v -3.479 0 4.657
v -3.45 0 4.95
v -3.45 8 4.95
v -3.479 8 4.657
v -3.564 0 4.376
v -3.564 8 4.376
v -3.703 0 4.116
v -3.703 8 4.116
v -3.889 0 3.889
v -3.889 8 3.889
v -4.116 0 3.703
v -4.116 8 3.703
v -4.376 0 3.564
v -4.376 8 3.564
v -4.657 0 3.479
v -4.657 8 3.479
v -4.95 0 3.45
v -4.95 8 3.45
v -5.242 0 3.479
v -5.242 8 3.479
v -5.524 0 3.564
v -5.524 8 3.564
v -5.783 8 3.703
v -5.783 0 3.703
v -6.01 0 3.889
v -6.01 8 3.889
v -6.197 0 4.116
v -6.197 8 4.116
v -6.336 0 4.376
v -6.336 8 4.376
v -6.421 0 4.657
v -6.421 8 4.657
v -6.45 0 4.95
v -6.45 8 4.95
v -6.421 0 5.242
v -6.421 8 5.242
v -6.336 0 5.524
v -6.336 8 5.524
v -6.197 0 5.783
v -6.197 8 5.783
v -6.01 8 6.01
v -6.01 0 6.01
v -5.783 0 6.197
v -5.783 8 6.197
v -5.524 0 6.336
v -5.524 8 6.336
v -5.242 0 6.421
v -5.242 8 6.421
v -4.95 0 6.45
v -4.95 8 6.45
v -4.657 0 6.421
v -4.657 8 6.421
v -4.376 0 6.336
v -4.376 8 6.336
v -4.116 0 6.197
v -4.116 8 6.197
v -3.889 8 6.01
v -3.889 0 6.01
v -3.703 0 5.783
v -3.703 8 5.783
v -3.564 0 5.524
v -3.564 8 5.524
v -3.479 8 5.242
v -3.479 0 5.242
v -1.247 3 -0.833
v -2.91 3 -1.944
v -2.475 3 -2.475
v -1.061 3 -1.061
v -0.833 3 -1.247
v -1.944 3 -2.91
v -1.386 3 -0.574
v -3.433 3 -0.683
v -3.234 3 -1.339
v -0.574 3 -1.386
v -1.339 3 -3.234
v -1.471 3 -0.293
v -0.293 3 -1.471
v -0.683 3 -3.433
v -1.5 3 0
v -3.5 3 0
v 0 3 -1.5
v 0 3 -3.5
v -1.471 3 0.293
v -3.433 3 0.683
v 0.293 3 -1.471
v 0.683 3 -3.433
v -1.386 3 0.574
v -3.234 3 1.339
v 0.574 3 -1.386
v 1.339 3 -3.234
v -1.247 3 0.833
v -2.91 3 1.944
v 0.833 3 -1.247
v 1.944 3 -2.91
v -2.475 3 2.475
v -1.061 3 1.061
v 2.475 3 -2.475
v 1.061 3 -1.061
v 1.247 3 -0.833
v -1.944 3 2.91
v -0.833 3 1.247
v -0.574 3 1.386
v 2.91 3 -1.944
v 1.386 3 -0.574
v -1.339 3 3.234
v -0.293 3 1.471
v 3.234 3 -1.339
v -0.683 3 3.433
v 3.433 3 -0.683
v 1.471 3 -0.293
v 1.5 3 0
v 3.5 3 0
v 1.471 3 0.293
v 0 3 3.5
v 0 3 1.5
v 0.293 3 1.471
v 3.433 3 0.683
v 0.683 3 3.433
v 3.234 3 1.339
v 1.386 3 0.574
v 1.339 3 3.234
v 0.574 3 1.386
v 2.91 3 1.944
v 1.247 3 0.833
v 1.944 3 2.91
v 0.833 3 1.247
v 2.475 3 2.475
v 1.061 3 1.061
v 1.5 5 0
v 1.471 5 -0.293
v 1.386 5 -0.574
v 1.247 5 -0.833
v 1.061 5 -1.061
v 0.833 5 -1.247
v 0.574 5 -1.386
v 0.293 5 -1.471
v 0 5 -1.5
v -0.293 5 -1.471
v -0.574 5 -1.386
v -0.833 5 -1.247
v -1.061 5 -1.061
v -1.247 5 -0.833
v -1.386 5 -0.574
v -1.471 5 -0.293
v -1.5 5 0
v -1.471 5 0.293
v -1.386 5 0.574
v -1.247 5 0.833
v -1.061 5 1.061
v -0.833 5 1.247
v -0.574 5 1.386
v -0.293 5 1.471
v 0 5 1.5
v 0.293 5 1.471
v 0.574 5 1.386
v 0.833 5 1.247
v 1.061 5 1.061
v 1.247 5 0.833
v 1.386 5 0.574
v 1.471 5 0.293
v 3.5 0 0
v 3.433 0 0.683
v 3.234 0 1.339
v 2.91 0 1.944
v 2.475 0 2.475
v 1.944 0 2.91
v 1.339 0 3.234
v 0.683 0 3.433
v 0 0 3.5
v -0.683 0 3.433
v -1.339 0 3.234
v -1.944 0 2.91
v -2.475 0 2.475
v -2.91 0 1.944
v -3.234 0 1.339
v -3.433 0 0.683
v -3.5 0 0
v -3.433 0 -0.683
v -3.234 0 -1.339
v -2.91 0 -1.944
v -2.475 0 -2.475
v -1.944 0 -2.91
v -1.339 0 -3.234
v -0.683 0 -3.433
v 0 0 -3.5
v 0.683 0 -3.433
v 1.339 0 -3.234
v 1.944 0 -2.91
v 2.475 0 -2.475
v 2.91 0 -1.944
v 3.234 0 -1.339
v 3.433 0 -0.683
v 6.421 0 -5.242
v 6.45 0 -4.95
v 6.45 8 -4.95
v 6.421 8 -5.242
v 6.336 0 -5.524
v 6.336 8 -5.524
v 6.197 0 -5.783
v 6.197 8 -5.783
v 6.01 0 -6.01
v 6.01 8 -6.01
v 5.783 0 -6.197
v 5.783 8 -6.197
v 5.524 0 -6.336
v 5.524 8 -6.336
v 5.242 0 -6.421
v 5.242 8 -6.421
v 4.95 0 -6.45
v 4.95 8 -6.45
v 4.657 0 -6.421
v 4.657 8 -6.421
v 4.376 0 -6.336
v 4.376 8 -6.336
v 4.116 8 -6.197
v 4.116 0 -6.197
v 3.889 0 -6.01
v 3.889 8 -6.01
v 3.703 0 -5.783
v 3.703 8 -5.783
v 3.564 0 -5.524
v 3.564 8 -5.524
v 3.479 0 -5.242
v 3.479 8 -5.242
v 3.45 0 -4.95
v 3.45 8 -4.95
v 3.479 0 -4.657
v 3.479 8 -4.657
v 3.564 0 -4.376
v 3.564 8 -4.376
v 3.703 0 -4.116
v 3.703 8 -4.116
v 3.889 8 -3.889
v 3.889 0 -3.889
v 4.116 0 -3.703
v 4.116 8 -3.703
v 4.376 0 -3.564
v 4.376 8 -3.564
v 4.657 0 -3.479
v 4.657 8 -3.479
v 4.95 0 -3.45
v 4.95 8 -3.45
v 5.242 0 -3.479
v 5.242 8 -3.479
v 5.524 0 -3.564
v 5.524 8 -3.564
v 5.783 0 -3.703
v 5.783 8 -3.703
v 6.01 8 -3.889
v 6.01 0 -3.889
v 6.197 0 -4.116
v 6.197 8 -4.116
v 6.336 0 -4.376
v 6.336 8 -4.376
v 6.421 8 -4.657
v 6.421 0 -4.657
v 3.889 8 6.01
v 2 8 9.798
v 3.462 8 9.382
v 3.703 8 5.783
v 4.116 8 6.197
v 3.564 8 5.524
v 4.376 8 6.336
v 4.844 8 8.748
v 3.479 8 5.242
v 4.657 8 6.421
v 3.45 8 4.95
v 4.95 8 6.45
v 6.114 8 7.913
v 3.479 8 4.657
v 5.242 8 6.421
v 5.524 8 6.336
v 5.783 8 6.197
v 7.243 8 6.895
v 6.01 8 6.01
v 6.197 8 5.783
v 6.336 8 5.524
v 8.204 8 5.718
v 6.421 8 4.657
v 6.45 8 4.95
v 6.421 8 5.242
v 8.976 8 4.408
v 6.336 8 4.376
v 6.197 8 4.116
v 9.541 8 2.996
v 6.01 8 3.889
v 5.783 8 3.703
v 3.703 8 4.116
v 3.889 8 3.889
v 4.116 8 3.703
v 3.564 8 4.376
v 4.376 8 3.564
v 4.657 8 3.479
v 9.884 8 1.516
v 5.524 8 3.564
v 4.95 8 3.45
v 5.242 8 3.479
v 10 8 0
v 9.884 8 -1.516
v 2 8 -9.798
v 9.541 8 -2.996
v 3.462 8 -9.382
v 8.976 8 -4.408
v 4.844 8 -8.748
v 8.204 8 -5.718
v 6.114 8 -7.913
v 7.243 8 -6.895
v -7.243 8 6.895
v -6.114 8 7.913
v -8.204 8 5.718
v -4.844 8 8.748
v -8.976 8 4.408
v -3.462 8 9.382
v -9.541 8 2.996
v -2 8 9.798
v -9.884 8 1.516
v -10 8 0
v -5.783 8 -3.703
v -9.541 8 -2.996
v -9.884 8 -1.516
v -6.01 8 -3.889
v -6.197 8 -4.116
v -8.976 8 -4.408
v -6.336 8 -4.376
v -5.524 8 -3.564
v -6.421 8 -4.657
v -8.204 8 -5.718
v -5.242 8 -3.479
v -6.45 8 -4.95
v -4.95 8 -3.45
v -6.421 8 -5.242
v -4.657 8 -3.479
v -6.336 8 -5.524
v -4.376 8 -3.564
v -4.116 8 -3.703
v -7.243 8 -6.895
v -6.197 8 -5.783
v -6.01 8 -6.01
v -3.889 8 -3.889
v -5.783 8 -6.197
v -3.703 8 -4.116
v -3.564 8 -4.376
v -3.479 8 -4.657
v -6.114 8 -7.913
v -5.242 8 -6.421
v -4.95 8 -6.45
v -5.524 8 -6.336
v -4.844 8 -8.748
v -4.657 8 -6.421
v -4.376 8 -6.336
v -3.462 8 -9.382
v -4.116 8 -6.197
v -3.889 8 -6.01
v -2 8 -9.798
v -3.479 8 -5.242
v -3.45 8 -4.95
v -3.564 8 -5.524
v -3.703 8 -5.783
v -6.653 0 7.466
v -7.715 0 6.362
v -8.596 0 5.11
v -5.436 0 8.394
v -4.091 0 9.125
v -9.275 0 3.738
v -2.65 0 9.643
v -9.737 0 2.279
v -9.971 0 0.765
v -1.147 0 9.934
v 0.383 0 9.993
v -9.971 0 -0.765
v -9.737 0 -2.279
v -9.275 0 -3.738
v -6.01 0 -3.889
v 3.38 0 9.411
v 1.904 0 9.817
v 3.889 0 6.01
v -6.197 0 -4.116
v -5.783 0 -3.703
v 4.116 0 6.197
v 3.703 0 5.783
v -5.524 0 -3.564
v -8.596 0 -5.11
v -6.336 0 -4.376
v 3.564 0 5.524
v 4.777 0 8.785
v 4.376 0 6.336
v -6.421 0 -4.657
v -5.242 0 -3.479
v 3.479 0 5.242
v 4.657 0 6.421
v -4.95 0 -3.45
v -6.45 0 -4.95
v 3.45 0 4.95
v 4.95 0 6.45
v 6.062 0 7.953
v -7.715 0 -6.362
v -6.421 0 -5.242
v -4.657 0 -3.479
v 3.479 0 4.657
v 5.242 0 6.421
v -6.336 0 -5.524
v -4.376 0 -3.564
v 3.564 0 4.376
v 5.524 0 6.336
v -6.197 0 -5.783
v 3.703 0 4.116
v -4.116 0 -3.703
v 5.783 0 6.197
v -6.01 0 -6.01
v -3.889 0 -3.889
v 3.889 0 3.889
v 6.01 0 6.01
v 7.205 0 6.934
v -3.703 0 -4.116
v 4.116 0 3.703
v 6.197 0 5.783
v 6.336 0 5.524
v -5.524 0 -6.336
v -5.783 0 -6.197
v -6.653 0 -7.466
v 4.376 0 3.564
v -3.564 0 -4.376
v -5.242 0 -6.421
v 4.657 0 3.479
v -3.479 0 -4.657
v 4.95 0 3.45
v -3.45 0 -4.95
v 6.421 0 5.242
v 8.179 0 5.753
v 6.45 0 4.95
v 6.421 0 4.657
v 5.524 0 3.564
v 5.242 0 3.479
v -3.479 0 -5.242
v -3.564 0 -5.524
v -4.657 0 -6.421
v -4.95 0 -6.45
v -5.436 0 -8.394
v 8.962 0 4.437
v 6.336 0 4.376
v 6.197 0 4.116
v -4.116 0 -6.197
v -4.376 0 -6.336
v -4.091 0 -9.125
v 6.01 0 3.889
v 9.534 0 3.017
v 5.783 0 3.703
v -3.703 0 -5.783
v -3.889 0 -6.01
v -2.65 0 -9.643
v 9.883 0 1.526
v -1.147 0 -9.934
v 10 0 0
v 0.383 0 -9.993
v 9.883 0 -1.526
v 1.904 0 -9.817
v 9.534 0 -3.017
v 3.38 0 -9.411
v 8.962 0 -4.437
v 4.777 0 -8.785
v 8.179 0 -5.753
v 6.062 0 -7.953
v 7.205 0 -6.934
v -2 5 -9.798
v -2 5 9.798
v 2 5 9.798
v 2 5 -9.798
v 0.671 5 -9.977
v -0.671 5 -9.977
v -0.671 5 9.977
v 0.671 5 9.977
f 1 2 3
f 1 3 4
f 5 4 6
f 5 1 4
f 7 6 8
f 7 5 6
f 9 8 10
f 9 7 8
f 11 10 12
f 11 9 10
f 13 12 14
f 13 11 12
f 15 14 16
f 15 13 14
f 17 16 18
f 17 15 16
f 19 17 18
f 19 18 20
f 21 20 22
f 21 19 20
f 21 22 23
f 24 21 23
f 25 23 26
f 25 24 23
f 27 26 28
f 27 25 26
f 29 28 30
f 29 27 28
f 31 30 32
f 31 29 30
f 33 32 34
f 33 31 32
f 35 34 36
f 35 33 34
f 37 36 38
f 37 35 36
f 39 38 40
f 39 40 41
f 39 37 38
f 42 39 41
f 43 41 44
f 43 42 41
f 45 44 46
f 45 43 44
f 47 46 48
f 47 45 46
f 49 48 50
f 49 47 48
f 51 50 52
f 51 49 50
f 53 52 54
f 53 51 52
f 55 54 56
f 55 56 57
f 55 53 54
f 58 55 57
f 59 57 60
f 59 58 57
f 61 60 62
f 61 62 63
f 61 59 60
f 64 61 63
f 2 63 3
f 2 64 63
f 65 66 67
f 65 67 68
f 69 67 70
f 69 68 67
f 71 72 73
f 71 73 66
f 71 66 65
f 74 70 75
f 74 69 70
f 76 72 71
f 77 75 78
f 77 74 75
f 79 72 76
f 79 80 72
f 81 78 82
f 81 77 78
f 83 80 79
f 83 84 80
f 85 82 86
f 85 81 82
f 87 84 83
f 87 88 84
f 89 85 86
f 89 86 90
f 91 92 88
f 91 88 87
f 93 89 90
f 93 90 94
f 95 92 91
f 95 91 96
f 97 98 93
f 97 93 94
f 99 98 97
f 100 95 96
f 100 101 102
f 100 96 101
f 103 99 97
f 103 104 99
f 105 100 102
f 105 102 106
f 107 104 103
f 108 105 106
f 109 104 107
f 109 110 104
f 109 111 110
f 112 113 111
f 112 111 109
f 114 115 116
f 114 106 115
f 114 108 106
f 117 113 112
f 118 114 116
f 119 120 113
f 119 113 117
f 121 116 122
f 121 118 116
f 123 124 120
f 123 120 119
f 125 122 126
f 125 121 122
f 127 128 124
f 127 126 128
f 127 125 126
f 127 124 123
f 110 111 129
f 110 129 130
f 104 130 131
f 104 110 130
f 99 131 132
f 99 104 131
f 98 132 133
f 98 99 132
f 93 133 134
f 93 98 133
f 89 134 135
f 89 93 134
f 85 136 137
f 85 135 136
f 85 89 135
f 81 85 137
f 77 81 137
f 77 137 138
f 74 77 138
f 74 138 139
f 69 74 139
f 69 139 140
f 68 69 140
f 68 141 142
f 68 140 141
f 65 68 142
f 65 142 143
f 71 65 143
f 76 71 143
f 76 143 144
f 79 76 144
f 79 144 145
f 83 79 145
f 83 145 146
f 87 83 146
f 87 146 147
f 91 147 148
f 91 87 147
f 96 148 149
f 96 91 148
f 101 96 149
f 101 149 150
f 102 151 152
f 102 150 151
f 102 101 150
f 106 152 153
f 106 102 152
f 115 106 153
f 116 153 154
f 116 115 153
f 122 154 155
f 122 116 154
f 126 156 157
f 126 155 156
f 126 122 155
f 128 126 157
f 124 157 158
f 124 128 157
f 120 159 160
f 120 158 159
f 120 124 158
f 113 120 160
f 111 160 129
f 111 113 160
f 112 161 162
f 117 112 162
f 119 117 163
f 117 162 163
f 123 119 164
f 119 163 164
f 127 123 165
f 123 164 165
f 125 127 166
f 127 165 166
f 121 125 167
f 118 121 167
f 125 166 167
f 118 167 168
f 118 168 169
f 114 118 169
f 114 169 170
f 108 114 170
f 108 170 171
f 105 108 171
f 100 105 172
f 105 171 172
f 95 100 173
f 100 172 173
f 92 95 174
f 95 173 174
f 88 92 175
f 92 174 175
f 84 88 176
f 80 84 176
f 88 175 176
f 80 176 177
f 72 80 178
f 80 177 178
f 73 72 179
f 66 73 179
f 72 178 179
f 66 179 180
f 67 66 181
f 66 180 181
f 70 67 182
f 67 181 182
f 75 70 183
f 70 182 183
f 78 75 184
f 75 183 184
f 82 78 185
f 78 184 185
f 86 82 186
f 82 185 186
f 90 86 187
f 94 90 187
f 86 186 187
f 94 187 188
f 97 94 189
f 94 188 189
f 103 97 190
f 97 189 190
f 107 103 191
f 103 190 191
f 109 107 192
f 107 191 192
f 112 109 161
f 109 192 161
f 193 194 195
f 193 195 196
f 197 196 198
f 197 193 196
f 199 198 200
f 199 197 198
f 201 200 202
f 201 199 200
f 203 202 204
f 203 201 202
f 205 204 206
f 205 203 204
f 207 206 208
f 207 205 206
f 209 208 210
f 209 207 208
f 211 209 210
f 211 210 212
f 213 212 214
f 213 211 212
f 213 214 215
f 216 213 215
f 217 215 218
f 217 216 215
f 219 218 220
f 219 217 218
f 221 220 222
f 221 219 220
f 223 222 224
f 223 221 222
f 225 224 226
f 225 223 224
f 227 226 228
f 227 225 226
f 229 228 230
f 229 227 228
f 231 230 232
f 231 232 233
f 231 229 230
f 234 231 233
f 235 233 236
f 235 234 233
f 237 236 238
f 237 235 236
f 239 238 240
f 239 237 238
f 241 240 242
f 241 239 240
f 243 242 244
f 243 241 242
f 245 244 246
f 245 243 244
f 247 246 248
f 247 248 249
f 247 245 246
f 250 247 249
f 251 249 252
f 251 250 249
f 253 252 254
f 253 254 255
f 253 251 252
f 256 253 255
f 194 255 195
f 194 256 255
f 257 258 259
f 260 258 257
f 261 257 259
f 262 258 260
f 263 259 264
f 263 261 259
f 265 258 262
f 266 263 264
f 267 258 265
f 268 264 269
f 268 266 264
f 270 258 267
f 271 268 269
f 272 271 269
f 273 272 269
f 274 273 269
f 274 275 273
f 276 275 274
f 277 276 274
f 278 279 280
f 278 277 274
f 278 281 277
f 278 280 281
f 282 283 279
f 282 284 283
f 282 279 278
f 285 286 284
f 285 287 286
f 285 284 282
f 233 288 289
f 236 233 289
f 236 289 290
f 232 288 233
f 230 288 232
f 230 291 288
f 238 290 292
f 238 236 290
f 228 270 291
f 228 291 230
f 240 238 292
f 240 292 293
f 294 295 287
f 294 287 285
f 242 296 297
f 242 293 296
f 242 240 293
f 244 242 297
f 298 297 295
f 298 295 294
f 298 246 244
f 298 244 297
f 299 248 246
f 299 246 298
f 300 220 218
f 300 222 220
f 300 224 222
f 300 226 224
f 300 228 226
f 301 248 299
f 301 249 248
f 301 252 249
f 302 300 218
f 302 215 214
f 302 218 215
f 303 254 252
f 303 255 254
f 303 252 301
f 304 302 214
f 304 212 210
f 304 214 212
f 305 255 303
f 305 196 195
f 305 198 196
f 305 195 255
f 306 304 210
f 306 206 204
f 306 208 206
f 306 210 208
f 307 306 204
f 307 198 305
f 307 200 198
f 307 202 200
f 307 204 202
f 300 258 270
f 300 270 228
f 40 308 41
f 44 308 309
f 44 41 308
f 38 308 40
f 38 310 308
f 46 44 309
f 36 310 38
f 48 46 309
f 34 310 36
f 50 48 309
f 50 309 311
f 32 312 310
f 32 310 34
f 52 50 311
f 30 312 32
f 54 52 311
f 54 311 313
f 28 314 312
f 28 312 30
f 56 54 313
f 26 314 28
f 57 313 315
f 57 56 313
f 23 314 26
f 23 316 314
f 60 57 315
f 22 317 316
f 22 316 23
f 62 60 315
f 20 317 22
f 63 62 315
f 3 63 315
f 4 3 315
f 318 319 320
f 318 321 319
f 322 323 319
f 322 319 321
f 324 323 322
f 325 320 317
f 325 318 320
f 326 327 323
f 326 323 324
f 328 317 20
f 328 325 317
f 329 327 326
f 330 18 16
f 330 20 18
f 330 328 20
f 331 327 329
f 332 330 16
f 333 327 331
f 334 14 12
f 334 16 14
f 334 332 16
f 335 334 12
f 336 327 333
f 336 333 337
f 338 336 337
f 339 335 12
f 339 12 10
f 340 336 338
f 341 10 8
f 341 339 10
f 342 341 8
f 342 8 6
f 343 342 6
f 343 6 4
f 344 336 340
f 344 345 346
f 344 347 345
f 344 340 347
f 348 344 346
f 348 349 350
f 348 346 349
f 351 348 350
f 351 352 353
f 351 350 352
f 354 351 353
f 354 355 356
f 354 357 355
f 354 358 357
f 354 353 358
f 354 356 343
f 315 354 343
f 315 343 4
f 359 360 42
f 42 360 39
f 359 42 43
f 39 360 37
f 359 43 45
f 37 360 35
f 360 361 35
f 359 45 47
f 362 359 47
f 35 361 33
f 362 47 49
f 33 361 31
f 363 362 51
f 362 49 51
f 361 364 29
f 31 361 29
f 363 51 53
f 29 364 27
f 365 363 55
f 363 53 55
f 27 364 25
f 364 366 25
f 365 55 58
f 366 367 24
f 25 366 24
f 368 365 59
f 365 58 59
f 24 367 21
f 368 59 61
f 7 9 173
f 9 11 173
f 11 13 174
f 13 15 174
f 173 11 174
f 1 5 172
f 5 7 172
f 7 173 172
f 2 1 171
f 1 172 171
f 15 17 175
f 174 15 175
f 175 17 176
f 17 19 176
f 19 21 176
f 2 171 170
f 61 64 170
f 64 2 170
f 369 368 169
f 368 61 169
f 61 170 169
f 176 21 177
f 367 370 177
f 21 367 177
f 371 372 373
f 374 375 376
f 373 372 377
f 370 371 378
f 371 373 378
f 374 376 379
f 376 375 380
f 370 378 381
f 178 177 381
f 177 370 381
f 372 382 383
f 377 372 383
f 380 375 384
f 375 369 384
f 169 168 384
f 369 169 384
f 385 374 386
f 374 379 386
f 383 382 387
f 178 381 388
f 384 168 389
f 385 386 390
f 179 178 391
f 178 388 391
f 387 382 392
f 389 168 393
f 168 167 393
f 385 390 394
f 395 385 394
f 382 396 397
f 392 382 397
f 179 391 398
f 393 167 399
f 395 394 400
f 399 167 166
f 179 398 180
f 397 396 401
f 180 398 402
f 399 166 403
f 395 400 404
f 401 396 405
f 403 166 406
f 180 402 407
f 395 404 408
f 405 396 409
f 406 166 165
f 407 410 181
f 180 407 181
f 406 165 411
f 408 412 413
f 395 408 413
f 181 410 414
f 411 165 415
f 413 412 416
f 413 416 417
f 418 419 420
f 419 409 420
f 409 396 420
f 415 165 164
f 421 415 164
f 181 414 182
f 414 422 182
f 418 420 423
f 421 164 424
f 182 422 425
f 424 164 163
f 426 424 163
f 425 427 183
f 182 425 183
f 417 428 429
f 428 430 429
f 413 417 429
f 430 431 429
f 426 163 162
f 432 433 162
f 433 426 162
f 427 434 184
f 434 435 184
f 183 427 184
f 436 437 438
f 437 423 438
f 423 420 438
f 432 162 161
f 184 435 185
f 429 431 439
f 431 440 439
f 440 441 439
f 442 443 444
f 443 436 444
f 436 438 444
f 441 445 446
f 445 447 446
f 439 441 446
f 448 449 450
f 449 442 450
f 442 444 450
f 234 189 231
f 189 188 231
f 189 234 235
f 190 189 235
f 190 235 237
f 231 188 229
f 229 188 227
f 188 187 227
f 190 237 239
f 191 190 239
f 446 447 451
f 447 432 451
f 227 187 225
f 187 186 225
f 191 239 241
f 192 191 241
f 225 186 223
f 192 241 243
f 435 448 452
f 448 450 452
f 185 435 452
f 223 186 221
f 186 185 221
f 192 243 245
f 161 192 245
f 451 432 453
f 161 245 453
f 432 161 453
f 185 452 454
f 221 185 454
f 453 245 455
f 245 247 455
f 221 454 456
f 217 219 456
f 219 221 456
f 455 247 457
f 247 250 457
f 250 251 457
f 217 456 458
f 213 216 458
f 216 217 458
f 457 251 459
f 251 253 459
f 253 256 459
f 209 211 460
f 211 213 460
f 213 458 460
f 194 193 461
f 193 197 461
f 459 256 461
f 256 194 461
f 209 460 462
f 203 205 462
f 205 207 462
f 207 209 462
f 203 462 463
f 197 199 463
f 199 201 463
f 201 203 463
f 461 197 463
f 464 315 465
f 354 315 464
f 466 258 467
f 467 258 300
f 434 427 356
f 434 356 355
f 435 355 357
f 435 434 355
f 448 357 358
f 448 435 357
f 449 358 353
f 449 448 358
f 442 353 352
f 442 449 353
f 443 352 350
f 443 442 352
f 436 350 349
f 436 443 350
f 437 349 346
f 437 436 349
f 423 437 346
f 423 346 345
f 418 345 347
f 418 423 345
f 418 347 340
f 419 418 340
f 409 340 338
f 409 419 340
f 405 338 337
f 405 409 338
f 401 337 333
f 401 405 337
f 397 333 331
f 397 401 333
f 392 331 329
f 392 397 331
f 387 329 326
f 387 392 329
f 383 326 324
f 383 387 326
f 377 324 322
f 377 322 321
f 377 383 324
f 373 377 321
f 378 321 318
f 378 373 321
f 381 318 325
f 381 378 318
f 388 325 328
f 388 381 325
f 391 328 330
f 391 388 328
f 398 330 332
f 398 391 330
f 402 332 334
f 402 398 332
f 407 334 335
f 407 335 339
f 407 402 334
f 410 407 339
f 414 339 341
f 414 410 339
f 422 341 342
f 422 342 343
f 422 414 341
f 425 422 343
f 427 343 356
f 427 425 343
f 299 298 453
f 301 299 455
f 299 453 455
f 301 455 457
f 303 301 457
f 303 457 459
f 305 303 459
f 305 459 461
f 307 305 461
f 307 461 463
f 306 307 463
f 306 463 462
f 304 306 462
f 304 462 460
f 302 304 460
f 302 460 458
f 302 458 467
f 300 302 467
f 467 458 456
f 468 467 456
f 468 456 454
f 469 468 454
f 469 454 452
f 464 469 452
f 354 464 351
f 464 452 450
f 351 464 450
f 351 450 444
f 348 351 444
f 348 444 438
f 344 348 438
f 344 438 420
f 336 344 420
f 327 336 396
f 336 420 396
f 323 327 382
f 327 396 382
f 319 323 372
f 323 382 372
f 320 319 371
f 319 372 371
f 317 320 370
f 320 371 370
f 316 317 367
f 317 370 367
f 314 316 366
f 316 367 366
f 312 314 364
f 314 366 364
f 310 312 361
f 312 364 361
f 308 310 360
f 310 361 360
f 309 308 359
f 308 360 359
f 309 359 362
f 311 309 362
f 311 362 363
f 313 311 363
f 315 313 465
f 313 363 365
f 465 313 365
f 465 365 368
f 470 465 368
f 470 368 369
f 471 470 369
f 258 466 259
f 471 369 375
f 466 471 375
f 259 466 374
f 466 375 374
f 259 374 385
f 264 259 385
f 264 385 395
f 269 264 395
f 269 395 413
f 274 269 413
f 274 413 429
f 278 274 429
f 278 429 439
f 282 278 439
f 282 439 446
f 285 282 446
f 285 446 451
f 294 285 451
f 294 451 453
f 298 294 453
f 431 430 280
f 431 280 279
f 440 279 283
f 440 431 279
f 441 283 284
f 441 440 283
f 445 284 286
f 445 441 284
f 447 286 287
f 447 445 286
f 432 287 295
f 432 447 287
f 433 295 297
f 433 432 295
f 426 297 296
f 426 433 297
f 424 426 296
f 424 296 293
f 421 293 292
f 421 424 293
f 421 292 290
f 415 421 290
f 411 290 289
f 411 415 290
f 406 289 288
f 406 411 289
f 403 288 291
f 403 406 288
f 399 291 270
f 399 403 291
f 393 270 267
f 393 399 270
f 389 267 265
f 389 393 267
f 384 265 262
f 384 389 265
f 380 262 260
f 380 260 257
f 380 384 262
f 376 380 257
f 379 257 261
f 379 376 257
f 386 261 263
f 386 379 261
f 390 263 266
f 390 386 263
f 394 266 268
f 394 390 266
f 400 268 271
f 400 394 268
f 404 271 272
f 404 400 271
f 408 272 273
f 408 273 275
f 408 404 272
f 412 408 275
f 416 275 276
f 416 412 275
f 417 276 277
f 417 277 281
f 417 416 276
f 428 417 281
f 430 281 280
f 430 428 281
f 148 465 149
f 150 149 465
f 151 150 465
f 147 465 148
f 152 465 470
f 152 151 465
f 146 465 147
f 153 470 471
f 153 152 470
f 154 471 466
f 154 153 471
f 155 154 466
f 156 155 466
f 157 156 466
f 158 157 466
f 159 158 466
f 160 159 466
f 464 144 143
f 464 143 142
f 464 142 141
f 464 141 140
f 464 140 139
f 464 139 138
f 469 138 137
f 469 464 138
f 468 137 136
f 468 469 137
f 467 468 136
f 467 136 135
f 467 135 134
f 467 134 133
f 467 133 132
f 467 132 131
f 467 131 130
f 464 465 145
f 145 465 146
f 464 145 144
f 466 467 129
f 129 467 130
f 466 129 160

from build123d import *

# Parameters (mm, degrees)
SKIZZE1_R                       = 10
SKIZZE1_R_2                     = 1.5
AUFSATZ_LINEAR_AUSTRAGEN1_DEPTH = 8
SKIZZE2_W                       = 4
SKIZZE2_H                       = 22.736350236
SCHNITT_LINEAR_AUSTRAGEN1_DEPTH = 3
SKIZZE3_R                       = 3.5
SCHNITT_LINEAR_AUSTRAGEN2_DEPTH = 3


with BuildPart() as part:
    # Skizze1 → Aufsatz-Linear austragen1 (new body)
    with BuildSketch(Plane(origin=(0, 0, 0), x_dir=(1, 0, 0), z_dir=(0, 1, 0))):
        Circle(SKIZZE1_R)
        with Locations((4.949747468, 4.949747468)):
            Circle(SKIZZE1_R_2, mode=Mode.SUBTRACT)
        with Locations((-4.949747468, 4.949747468)):
            Circle(SKIZZE1_R_2, mode=Mode.SUBTRACT)
        with Locations((-4.949747468, -4.949747468)):
            Circle(SKIZZE1_R_2, mode=Mode.SUBTRACT)
        with Locations((4.949747468, -4.949747468)):
            Circle(SKIZZE1_R_2, mode=Mode.SUBTRACT)
        Circle(SKIZZE1_R_2, mode=Mode.SUBTRACT)
    extrude(amount=AUFSATZ_LINEAR_AUSTRAGEN1_DEPTH)

    # Skizze2 → Schnitt-Linear austragen1 (cut)
    with BuildSketch(Plane(origin=(0, 8, 0), x_dir=(1, 0, 0), z_dir=(0, 1, 0))):
        Rectangle(SKIZZE2_W, SKIZZE2_H)
    extrude(amount=-SCHNITT_LINEAR_AUSTRAGEN1_DEPTH, mode=Mode.SUBTRACT)

    # Skizze3 → Schnitt-Linear austragen2 (cut)
    with BuildSketch(Plane.XZ):
        Circle(SKIZZE3_R)
    extrude(amount=-SCHNITT_LINEAR_AUSTRAGEN2_DEPTH, mode=Mode.SUBTRACT)


solid = part.part
